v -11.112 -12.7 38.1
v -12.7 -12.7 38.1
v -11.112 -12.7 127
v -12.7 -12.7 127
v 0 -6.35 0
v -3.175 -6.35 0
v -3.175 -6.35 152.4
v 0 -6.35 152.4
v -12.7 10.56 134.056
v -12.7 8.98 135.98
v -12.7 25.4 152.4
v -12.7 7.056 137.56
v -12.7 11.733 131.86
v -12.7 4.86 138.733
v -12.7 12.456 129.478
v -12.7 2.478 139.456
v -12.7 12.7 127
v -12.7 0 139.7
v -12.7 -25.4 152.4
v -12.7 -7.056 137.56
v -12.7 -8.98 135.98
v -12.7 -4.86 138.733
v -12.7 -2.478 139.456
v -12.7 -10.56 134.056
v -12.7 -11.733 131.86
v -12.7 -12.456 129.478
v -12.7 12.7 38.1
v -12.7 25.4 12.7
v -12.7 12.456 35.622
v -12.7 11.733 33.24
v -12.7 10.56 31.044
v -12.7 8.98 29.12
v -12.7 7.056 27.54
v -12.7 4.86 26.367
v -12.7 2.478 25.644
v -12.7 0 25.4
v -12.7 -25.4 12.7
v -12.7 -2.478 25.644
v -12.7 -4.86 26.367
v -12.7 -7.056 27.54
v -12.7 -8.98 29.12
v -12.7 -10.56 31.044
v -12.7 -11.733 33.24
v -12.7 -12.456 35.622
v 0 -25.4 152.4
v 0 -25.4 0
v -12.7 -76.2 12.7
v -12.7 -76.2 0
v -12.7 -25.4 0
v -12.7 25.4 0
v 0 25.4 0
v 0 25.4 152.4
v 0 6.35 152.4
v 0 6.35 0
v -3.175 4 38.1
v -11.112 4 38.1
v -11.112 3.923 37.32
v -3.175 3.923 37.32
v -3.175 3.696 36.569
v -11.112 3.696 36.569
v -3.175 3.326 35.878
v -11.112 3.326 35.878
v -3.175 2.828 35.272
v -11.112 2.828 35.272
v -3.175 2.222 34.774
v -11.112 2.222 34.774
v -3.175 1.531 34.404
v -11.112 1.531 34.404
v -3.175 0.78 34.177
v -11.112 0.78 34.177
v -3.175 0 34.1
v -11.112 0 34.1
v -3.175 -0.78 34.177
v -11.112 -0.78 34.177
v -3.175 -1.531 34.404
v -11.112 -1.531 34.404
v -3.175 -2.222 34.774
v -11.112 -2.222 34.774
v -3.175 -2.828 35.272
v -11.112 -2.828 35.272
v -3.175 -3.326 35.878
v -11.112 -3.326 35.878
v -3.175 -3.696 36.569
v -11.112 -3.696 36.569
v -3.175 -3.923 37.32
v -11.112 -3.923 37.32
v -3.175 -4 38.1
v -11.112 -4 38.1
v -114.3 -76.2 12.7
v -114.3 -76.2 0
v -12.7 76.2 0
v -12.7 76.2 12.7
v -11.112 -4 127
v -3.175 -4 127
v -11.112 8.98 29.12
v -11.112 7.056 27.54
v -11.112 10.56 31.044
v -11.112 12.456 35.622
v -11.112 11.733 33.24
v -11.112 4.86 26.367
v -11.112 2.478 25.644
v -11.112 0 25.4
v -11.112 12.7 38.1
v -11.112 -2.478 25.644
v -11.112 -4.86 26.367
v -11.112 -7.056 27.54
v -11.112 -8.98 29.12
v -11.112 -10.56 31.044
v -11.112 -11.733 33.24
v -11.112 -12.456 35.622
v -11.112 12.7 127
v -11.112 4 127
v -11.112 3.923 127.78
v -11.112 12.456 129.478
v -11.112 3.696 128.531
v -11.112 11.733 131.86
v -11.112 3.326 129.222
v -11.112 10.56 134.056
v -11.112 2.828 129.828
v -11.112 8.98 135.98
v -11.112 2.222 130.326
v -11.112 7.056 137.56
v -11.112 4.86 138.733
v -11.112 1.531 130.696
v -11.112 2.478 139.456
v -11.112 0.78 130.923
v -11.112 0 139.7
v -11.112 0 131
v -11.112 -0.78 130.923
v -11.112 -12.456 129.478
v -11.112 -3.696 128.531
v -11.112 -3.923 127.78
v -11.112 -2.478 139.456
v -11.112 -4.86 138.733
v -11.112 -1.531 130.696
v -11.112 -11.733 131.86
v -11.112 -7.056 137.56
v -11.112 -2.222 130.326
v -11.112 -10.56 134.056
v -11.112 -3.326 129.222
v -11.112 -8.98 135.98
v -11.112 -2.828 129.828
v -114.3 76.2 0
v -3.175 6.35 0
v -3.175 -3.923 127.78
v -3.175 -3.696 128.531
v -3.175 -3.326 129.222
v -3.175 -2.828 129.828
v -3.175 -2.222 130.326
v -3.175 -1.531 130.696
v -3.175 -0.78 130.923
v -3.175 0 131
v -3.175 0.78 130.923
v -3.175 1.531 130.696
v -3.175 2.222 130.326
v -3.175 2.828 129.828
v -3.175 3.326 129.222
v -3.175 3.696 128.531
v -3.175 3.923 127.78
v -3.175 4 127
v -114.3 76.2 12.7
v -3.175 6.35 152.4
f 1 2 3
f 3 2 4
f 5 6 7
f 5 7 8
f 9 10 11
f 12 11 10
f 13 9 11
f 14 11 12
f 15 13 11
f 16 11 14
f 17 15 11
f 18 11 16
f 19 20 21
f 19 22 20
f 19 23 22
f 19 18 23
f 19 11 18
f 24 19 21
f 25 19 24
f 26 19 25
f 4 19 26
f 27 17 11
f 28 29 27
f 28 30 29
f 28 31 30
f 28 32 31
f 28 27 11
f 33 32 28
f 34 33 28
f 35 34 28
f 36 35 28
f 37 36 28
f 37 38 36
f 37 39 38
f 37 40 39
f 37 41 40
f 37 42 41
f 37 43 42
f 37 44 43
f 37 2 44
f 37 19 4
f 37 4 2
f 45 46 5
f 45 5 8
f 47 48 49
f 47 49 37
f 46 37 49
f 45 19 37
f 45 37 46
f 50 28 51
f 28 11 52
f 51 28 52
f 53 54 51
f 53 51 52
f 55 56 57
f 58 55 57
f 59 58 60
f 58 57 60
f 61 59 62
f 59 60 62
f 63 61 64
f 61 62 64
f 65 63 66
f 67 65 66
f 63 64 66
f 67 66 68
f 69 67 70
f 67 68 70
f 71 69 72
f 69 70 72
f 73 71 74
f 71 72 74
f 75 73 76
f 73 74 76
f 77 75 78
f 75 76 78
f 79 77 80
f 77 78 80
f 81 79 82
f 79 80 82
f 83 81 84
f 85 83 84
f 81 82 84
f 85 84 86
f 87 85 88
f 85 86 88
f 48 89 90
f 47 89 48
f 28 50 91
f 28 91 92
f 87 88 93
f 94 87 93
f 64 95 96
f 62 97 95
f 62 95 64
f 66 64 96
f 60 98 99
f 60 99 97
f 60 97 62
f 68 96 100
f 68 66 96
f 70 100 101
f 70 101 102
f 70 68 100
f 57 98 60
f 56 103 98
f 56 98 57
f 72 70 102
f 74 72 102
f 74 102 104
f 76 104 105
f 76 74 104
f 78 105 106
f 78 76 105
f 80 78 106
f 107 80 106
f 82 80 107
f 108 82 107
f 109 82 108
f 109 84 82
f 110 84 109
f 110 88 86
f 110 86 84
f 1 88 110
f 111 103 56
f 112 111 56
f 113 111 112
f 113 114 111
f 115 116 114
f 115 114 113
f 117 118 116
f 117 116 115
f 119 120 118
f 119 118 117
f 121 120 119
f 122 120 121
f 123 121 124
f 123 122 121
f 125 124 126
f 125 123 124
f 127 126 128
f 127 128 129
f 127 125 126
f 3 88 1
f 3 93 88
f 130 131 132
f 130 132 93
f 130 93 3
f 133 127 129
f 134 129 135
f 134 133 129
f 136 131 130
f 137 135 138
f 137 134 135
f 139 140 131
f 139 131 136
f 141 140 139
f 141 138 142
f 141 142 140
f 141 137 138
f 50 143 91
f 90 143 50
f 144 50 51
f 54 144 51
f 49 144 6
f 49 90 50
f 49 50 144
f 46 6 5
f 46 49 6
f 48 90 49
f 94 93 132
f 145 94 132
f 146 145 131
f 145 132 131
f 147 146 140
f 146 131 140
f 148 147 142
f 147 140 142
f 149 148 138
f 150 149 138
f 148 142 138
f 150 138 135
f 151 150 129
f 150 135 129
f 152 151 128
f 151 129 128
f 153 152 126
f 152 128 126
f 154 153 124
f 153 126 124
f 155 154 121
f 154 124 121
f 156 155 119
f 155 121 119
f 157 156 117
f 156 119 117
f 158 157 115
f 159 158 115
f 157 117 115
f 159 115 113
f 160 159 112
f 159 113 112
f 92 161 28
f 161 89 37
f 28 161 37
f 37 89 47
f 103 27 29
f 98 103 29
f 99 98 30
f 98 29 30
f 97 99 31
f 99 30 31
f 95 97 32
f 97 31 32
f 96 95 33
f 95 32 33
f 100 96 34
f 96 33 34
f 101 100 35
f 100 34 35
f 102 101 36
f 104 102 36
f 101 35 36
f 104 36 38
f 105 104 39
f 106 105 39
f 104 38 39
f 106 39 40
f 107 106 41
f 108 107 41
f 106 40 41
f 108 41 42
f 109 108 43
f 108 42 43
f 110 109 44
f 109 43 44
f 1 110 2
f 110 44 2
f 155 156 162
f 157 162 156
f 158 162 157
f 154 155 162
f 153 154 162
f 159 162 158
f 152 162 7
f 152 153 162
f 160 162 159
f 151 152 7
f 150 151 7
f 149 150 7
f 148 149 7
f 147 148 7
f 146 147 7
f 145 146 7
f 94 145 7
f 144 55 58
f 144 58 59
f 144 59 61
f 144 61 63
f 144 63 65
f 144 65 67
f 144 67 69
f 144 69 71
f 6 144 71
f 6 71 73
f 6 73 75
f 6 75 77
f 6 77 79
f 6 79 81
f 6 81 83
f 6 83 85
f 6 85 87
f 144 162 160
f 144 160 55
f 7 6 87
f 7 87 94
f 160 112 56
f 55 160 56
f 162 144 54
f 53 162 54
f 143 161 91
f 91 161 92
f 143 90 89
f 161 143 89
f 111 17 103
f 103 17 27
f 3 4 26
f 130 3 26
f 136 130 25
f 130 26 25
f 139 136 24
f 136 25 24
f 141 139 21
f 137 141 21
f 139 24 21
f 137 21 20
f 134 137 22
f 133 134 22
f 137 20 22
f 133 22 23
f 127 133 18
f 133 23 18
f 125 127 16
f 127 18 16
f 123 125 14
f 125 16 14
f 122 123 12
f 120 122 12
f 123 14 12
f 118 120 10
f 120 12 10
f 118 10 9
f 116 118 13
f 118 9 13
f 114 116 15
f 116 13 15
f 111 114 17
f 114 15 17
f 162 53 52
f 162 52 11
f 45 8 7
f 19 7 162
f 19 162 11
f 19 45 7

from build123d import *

# Parameters (mm, degrees)
F1_DEPTH = 25.4
F0_W     = 101.6
F0_H     = 12.7
F2_DEPTH = 76.2
F3_W     = 3.175
F3_H     = 12.7
F4_DEPTH = 152.4
F6_DEPTH = 12.701
F7_DEPTH = 1.5875


with BuildPart() as f1:
    # F0 (on Front) → F1 (new body, symmetric)
    with BuildSketch(Plane.XZ):
        Polygon((-12.7, 0), (0, 0), (0, 152.4), (-12.7, 152.4), (-12.7, 12.7), align=None)
    extrude(amount=F1_DEPTH, both=True)

    # F0 (on Front) → F2 (join, symmetric)
    with BuildSketch(Plane.XZ):
        with Locations((-63.5, 6.35)):
            Rectangle(F0_W, F0_H)
    extrude(amount=F2_DEPTH, both=True)

    # F3 (on face) → F4 (cut, through all)
    with BuildSketch(Plane(origin=(0, 0, 0), x_dir=(1, 0, 0), z_dir=(0, 0, -1))):
        with Locations((-1.5875, 0)):
            Rectangle(F3_W, F3_H)
    extrude(amount=-F4_DEPTH, mode=Mode.SUBTRACT)

    # F5 (on face) → F6 (cut, through all)
    with BuildSketch(Plane(origin=(-12.7, 0, 0), x_dir=(0, -1, 0), z_dir=(-1, 0, 0))):
        with BuildLine():
            ThreePointArc((-4, 38.1), (0, 34.1), (4, 38.1))
            Line((4, 38.1), (4, 127))
            ThreePointArc((4, 127), (0, 131), (-4, 127))
            Line((-4, 127), (-4, 38.1))
        make_face()
    extrude(amount=-F6_DEPTH, mode=Mode.SUBTRACT)

    # F5 (on face) → F7 (cut)
    with BuildSketch(Plane(origin=(-12.7, 0, 0), x_dir=(0, -1, 0), z_dir=(-1, 0, 0))):
        with BuildLine():
            ThreePointArc((-12.7, 38.1), (0, 25.4), (12.7, 38.1))
            Line((12.7, 38.1), (12.7, 127))
            ThreePointArc((12.7, 127), (0, 139.7), (-12.7, 127))
            Line((-12.7, 127), (-12.7, 38.1))
        make_face()
        with BuildLine():
            Line((4, 127), (4, 38.1))
            ThreePointArc((4, 38.1), (0, 34.1), (-4, 38.1))
            Line((-4, 38.1), (-4, 127))
            ThreePointArc((-4, 127), (0, 131), (4, 127))
        make_face(mode=Mode.SUBTRACT)
    extrude(amount=-F7_DEPTH, mode=Mode.SUBTRACT)


solid = f1.part
